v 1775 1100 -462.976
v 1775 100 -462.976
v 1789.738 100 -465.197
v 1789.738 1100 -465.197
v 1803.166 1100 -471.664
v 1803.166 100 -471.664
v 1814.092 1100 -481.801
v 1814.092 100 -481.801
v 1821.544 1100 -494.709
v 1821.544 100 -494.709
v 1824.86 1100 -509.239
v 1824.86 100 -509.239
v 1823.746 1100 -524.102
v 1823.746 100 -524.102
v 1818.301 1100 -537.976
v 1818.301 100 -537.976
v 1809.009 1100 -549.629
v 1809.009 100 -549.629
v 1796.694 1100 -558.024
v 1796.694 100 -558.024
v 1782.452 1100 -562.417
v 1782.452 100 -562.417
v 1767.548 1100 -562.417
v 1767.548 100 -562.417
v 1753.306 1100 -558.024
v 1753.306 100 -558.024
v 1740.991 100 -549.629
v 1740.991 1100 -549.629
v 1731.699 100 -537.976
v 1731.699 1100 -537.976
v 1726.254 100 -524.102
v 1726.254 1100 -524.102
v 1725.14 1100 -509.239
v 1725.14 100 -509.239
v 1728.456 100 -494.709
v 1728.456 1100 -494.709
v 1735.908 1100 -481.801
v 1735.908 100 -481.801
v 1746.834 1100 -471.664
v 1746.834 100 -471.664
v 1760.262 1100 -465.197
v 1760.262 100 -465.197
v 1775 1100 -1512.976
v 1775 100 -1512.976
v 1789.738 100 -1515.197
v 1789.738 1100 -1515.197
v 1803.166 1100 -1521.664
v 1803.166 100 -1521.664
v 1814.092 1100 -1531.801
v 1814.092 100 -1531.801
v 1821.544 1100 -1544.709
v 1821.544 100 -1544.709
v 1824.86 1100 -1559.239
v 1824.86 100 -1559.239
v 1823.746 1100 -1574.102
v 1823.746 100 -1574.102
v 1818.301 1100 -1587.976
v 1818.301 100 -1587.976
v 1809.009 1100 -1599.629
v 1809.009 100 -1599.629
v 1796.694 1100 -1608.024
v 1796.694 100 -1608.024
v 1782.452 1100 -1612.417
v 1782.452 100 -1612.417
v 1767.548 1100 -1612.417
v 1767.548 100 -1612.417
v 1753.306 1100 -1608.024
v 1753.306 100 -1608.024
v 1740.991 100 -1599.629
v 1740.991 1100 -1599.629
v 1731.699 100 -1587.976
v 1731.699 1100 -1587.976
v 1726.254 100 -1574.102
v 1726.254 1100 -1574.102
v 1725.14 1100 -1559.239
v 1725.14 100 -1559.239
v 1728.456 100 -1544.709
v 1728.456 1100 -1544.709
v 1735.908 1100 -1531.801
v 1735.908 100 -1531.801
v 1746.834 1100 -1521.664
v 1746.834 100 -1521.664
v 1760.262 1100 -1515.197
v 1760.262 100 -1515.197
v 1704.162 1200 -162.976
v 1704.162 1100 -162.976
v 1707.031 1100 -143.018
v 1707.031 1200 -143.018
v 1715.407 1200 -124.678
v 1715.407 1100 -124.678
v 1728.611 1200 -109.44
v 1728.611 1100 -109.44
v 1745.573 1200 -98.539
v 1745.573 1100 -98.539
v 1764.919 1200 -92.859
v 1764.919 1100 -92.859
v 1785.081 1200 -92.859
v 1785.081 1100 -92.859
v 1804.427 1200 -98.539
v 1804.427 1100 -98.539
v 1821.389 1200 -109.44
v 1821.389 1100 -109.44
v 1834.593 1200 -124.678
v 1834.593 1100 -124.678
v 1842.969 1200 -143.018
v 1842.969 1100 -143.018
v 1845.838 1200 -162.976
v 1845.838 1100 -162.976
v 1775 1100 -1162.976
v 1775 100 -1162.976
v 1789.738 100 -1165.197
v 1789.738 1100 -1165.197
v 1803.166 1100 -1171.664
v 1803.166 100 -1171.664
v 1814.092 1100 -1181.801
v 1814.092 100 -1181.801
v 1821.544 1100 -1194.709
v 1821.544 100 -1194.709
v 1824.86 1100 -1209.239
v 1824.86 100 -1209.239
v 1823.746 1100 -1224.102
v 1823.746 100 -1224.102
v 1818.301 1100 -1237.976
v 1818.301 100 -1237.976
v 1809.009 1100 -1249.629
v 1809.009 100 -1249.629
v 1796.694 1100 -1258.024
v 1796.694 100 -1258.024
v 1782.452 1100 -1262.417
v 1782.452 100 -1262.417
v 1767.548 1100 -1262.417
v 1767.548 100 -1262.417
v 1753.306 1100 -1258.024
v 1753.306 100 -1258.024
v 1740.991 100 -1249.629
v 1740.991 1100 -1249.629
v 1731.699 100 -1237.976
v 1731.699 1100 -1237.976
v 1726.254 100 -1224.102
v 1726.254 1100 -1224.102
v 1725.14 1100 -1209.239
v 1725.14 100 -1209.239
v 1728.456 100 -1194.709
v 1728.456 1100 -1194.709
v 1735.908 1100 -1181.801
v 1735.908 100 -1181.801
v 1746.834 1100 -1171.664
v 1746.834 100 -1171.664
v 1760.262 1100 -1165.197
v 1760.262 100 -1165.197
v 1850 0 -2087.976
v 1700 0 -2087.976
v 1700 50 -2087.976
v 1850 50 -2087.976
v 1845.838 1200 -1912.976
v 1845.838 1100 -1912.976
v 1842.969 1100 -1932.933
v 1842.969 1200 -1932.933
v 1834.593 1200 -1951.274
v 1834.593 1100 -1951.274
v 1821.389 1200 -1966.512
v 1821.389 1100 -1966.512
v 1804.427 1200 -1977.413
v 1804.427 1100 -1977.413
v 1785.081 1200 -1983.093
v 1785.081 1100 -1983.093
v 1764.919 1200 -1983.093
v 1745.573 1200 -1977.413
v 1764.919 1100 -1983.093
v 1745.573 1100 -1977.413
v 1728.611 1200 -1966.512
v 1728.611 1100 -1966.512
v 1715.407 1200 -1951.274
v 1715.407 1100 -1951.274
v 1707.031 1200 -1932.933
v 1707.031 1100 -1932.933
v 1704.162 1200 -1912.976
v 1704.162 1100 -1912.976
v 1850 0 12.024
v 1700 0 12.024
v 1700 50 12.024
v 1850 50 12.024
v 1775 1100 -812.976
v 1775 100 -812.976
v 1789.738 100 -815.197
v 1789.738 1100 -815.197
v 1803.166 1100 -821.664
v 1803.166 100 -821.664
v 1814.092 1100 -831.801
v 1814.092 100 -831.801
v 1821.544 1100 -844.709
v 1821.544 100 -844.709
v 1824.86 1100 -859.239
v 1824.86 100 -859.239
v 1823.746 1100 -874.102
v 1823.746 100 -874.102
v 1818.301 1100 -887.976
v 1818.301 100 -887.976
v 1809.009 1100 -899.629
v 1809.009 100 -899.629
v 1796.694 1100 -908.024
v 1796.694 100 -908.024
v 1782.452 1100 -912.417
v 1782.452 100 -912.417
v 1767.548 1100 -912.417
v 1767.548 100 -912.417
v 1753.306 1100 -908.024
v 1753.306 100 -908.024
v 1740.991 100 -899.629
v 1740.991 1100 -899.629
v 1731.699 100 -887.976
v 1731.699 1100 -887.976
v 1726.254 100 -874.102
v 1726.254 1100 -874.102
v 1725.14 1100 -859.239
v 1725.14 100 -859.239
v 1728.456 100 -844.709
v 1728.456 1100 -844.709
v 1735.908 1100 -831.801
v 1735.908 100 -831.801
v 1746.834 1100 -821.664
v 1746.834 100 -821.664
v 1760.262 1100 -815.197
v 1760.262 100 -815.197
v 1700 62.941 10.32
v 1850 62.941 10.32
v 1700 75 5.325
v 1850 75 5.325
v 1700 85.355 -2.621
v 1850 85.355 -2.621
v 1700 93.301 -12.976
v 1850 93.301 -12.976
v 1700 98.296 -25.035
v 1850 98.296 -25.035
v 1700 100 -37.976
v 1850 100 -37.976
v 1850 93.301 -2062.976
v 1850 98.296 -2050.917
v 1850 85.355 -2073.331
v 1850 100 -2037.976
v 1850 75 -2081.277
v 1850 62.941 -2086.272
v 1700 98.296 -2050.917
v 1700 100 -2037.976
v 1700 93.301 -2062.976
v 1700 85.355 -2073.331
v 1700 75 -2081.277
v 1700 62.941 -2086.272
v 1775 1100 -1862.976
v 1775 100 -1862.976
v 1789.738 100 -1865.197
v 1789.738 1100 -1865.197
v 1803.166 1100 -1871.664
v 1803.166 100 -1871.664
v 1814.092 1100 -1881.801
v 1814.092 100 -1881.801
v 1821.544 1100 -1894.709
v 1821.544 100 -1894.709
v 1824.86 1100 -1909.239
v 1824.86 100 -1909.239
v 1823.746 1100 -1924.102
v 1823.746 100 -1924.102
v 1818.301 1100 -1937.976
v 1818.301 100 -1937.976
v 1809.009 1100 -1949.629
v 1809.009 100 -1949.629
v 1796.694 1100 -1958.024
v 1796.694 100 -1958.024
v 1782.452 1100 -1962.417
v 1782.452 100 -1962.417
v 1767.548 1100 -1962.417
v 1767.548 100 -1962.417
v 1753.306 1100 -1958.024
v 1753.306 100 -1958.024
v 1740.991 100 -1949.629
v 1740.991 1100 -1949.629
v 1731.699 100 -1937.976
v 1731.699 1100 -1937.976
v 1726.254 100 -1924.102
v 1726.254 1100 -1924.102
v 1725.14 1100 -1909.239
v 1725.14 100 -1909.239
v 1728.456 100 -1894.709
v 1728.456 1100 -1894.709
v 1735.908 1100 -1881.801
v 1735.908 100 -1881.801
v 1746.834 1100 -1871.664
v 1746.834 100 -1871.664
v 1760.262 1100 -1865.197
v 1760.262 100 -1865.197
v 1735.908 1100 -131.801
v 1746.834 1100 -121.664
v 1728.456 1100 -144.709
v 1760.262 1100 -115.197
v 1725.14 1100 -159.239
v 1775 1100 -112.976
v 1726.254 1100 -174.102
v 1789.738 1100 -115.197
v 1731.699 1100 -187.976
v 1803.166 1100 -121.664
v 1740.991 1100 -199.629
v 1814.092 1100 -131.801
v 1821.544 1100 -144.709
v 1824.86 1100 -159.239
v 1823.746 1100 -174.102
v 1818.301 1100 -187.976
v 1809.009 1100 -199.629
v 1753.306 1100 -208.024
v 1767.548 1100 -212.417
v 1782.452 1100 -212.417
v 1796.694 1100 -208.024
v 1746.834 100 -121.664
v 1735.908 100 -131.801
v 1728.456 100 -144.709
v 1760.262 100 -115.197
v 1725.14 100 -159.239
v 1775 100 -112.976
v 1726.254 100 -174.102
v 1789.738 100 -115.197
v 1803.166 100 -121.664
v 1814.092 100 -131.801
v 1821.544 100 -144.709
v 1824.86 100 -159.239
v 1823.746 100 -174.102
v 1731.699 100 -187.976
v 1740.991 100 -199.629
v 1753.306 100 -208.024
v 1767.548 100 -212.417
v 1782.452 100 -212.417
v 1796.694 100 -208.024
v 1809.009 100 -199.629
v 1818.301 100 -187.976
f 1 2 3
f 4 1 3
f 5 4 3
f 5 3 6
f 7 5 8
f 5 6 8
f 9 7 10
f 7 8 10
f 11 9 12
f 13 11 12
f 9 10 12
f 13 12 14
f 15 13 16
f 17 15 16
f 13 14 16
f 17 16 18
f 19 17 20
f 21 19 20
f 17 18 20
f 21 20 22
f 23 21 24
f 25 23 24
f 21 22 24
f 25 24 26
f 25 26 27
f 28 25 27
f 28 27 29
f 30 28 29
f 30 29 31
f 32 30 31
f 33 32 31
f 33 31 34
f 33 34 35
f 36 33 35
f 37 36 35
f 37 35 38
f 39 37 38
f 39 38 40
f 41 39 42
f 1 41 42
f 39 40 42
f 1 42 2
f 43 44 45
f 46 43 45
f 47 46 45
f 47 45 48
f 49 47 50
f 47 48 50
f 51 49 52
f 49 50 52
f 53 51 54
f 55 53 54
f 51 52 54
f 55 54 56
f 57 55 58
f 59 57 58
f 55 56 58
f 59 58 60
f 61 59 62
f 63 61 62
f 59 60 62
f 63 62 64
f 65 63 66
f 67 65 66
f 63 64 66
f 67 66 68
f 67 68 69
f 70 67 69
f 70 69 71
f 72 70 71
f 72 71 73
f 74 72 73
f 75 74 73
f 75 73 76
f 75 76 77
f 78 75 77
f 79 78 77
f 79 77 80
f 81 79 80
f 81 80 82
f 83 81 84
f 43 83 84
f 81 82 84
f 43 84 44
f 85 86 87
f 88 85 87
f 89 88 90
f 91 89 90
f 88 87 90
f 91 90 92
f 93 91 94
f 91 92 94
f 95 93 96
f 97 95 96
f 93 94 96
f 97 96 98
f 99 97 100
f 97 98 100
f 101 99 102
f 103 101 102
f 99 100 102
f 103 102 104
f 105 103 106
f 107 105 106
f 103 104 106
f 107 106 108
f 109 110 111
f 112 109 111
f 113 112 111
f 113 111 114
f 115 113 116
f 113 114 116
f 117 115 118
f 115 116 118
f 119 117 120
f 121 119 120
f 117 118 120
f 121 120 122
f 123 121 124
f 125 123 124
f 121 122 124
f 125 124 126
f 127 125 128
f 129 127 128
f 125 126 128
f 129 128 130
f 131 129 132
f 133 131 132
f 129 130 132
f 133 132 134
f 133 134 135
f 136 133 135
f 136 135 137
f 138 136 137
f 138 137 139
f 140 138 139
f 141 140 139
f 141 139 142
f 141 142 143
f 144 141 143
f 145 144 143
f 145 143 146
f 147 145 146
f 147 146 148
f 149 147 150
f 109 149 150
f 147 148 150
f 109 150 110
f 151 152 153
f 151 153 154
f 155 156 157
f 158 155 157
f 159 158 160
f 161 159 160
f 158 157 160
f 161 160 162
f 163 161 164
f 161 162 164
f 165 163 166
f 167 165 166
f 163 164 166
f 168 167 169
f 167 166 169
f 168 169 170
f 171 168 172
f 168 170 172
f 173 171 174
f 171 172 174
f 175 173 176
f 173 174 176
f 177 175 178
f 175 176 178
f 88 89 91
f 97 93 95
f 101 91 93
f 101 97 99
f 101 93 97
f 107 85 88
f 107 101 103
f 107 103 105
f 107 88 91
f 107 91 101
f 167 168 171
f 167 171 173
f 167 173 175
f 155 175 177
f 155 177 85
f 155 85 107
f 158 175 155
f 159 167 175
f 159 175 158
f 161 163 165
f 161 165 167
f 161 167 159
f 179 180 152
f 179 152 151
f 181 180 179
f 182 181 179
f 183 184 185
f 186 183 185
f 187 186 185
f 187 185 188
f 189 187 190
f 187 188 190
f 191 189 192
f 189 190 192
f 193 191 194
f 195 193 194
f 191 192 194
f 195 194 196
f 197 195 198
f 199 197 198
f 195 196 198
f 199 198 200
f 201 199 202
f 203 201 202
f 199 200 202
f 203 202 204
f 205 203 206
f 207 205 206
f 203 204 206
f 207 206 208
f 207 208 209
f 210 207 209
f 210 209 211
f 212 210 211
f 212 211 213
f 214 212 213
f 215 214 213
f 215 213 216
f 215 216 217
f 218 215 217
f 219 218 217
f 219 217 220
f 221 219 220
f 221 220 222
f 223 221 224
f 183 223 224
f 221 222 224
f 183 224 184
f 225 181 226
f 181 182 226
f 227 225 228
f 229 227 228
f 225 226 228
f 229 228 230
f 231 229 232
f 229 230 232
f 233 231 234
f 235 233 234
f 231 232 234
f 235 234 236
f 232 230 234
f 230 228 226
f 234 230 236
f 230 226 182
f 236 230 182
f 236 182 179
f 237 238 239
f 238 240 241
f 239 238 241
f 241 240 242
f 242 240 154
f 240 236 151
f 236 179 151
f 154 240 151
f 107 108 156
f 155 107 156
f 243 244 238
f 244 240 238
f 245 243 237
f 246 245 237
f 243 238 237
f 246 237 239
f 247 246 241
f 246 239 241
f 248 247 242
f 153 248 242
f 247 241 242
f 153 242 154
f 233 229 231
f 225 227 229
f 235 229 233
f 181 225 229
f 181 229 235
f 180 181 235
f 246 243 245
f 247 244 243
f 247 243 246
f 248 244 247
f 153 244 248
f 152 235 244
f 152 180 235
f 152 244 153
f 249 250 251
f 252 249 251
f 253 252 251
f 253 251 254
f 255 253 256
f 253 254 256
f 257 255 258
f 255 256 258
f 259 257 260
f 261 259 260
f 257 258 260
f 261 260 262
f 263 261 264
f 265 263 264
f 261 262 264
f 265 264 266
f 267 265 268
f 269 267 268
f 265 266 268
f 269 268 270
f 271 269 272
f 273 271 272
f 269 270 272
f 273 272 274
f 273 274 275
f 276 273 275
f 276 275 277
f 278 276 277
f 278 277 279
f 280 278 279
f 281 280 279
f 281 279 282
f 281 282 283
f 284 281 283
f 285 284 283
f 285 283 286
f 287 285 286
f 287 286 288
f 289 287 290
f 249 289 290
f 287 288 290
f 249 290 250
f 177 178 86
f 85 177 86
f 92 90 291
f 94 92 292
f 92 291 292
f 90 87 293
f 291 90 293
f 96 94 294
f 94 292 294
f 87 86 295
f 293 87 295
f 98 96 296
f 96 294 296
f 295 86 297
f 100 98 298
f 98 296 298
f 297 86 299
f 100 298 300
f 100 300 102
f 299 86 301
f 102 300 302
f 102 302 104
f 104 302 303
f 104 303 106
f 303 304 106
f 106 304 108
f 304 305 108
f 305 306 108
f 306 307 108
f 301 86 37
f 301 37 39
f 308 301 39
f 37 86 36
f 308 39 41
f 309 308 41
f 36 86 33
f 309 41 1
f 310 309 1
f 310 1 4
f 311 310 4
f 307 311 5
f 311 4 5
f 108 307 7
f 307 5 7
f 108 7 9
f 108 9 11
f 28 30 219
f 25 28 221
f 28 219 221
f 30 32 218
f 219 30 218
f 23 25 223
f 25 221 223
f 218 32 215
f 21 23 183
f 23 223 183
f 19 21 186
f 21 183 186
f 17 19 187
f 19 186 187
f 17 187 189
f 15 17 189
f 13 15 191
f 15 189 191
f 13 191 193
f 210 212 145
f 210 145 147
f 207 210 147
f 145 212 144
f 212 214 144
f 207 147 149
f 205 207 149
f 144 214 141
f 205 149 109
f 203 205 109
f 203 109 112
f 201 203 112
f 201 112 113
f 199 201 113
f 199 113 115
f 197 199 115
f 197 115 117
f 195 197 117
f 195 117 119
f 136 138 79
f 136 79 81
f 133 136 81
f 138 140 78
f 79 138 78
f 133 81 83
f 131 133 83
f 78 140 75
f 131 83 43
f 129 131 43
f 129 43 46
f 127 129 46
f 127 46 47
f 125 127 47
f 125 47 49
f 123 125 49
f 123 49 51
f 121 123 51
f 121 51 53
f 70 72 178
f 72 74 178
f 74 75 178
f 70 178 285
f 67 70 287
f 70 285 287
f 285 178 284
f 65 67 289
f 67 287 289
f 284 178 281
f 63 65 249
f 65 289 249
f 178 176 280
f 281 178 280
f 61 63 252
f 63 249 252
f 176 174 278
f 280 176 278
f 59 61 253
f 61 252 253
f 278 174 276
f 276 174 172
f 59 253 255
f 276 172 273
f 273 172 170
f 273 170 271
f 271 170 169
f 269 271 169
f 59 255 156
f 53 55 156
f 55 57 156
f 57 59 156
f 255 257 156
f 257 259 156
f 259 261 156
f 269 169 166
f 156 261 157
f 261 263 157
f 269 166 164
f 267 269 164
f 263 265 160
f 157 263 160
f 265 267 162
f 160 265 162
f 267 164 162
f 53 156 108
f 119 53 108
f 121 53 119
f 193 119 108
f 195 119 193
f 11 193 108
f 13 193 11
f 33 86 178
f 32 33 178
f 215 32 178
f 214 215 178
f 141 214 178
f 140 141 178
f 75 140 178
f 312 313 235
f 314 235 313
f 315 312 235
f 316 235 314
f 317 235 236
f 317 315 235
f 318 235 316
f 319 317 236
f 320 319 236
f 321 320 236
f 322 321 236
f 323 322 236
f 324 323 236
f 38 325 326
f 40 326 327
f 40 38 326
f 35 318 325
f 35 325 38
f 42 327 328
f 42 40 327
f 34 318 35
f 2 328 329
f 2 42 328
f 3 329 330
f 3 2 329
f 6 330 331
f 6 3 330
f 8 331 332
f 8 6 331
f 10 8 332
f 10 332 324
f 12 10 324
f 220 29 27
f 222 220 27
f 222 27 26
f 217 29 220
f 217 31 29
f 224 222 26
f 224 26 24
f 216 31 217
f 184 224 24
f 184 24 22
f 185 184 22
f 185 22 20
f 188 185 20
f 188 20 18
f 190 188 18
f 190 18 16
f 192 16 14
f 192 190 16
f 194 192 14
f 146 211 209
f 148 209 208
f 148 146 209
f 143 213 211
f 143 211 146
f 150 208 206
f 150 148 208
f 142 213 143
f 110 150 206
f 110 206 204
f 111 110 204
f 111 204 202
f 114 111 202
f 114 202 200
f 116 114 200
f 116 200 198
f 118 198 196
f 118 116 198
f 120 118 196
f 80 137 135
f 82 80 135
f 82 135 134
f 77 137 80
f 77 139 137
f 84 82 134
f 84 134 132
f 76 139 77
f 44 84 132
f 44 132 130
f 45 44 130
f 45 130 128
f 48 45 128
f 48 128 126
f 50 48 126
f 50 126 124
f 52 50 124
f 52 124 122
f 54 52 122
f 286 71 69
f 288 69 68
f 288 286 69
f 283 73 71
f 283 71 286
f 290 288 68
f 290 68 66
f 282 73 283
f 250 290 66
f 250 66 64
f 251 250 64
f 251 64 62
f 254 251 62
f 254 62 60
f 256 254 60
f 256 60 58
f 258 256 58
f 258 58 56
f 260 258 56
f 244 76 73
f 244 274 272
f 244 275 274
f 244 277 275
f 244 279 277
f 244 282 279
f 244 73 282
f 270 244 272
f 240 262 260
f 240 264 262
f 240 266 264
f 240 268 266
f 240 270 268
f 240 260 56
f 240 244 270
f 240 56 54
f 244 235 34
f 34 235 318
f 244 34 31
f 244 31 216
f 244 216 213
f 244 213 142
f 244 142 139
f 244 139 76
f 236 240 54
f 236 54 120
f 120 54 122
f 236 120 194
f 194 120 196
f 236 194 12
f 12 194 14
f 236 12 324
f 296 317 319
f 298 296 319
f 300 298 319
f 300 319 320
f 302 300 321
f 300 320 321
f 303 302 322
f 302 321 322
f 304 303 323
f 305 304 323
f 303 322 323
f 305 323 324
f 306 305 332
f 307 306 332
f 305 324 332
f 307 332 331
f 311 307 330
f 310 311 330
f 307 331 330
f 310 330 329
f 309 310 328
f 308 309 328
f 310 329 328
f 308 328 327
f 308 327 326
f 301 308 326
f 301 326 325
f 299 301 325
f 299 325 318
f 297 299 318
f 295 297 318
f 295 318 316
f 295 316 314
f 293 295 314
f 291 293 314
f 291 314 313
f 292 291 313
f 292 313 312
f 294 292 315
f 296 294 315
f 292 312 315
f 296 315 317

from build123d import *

# Parameters (mm, degrees)
SKETCH2_W               = 150
SKETCH2_H               = 2100
BOSS_EXTRUDE3_DEPTH     = 100
BOSS_EXTRUDE3_2_DEPTH   = 100
SKETCH3_R               = 50
BOSS_EXTRUDE4_DEPTH     = 1000
LPATTERN1_COUNT         = 6
LPATTERN1_PITCH         = 350
SKETCH5_R               = 50
BOSS_EXTRUDE5_DEPTH     = 1000
LPATTERN2_COUNT         = 6
LPATTERN2_PITCH         = 350
FILLET1_R               = 50
FILLET2_R               = 50
FILLET3_R               = 50
FILLET4_R               = 50
BOSS_EXTRUDE8_DEPTH     = 100
CUT_EXTRUDE1_DEPTH      = 2000
CUT_EXTRUDE1_DEPTH_BACK = 2000
SKETCH14_W              = 805.257541721
SKETCH14_H              = 2502.966116942


with BuildPart() as part:
    # Sketch2 → Boss-Extrude3 (new body)
    with BuildSketch(Plane(origin=(0, 0, 0), x_dir=(1, 0, 0), z_dir=(0, 1, 0))):
        with Locations((1775, 1037.975951904)):
            Rectangle(SKETCH2_W, SKETCH2_H)
    extrude(amount=BOSS_EXTRUDE3_DEPTH)

    # Sketch5 → Boss-Extrude5 (add)
    with BuildSketch(Plane(origin=(0, 100, 0), x_dir=(1, 0, 0), z_dir=(0, 1, 0))):
        with Locations(Location((1775, 1912.975951904, 0), (0, 0, 270))):
            Circle(SKETCH5_R)
    boss_extrude5 = extrude(amount=BOSS_EXTRUDE5_DEPTH)

    # LPattern2: Boss-Extrude5 ×6
    with Locations(*[(0, 0, i * LPATTERN2_PITCH) for i in range(1, LPATTERN2_COUNT)]):
        add(boss_extrude5)

    # Fillet3
    fillet3_edges = [part.edges().sort_by_distance(p)[0] for p in [
        (1775, 100, 12.024048096),
    ]]
    fillet(fillet3_edges, radius=FILLET3_R)

    # Fillet4
    fillet4_edges = [part.edges().sort_by_distance(p)[0] for p in [
        (1775, 100, -2087.975951904),
    ]]
    fillet(fillet4_edges, radius=FILLET4_R)



with BuildPart() as body_2:
    # Sketch2 → Boss-Extrude3 2 (new body)
    with BuildSketch(Plane(origin=(0, 0, 0), x_dir=(1, 0, 0), z_dir=(0, 1, 0))):
        with Locations((-1775, 1037.975951904)):
            Rectangle(SKETCH2_W, SKETCH2_H)
    extrude(amount=BOSS_EXTRUDE3_2_DEPTH)

    # Sketch3 → Boss-Extrude4 (add)
    with BuildSketch(Plane(origin=(0, 100, 0), x_dir=(1, 0, 0), z_dir=(0, 1, 0))):
        with Locations(Location((-1775, 162.975951904, 0), (0, 0, 90))):
            Circle(SKETCH3_R)
    boss_extrude4 = extrude(amount=BOSS_EXTRUDE4_DEPTH)

    # LPattern1: Boss-Extrude4 ×6
    with Locations(*[(0, 0, -i * LPATTERN1_PITCH) for i in range(1, LPATTERN1_COUNT)]):
        add(boss_extrude4)

    # Fillet1
    fillet1_edges = [body_2.edges().sort_by_distance(p)[0] for p in [
        (-1775, 100, -2087.975951904),
    ]]
    fillet(fillet1_edges, radius=FILLET1_R)

    # Fillet2
    fillet2_edges = [body_2.edges().sort_by_distance(p)[0] for p in [
        (-1775, 100, 12.024048096),
    ]]
    fillet(fillet2_edges, radius=FILLET2_R)


with BuildPart() as part_1:
    add(part.part)

    add(body_2.part)  # Boss-Extrude8 merges body 2
    # Sketch13 → Boss-Extrude8 (add)
    with BuildSketch(Plane(origin=(0, 1100, 0), x_dir=(1, 0, 0), z_dir=(0, 1, 0))):
        with BuildLine():
            Line((-1845.838339321, 162.975951904), (-1845.838339321, 1912.975951904))
            ThreePointArc((-1845.838339321, 1912.975951904), (-1775, 1983.814291225), (-1704.161660679, 1912.975951904))
            Line((-1704.161660679, 1912.975951904), (-1704.161660679, 162.975951904))
            ThreePointArc((-1704.161660679, 162.975951904), (-1775, 92.137612583), (-1845.838339321, 162.975951904))
        make_face()
        with BuildLine():
            Line((1845.838339321, 162.975951904), (1845.838339321, 1912.975951904))
            ThreePointArc((1845.838339321, 1912.975951904), (1775, 1983.814291225), (1704.161660679, 1912.975951904))
            Line((1704.161660679, 1912.975951904), (1704.161660679, 162.975951904))
            ThreePointArc((1704.161660679, 162.975951904), (1775, 92.137612583), (1845.838339321, 162.975951904))
        make_face()
    extrude(amount=BOSS_EXTRUDE8_DEPTH)

    # Sketch14 → Cut-Extrude1 (cut, two sides: drawn at the far end of the back side and taken through both)
    with BuildSketch(Plane(origin=(0, 1100, 0), x_dir=(1, 0, 0), z_dir=(0, 1, 0)).offset(-CUT_EXTRUDE1_DEPTH_BACK)):
        with Locations((-1496.523875696, 935.395373341)):
            Rectangle(SKETCH14_W, SKETCH14_H)
    extrude(amount=CUT_EXTRUDE1_DEPTH + CUT_EXTRUDE1_DEPTH_BACK, mode=Mode.SUBTRACT)


solid = part_1.part
